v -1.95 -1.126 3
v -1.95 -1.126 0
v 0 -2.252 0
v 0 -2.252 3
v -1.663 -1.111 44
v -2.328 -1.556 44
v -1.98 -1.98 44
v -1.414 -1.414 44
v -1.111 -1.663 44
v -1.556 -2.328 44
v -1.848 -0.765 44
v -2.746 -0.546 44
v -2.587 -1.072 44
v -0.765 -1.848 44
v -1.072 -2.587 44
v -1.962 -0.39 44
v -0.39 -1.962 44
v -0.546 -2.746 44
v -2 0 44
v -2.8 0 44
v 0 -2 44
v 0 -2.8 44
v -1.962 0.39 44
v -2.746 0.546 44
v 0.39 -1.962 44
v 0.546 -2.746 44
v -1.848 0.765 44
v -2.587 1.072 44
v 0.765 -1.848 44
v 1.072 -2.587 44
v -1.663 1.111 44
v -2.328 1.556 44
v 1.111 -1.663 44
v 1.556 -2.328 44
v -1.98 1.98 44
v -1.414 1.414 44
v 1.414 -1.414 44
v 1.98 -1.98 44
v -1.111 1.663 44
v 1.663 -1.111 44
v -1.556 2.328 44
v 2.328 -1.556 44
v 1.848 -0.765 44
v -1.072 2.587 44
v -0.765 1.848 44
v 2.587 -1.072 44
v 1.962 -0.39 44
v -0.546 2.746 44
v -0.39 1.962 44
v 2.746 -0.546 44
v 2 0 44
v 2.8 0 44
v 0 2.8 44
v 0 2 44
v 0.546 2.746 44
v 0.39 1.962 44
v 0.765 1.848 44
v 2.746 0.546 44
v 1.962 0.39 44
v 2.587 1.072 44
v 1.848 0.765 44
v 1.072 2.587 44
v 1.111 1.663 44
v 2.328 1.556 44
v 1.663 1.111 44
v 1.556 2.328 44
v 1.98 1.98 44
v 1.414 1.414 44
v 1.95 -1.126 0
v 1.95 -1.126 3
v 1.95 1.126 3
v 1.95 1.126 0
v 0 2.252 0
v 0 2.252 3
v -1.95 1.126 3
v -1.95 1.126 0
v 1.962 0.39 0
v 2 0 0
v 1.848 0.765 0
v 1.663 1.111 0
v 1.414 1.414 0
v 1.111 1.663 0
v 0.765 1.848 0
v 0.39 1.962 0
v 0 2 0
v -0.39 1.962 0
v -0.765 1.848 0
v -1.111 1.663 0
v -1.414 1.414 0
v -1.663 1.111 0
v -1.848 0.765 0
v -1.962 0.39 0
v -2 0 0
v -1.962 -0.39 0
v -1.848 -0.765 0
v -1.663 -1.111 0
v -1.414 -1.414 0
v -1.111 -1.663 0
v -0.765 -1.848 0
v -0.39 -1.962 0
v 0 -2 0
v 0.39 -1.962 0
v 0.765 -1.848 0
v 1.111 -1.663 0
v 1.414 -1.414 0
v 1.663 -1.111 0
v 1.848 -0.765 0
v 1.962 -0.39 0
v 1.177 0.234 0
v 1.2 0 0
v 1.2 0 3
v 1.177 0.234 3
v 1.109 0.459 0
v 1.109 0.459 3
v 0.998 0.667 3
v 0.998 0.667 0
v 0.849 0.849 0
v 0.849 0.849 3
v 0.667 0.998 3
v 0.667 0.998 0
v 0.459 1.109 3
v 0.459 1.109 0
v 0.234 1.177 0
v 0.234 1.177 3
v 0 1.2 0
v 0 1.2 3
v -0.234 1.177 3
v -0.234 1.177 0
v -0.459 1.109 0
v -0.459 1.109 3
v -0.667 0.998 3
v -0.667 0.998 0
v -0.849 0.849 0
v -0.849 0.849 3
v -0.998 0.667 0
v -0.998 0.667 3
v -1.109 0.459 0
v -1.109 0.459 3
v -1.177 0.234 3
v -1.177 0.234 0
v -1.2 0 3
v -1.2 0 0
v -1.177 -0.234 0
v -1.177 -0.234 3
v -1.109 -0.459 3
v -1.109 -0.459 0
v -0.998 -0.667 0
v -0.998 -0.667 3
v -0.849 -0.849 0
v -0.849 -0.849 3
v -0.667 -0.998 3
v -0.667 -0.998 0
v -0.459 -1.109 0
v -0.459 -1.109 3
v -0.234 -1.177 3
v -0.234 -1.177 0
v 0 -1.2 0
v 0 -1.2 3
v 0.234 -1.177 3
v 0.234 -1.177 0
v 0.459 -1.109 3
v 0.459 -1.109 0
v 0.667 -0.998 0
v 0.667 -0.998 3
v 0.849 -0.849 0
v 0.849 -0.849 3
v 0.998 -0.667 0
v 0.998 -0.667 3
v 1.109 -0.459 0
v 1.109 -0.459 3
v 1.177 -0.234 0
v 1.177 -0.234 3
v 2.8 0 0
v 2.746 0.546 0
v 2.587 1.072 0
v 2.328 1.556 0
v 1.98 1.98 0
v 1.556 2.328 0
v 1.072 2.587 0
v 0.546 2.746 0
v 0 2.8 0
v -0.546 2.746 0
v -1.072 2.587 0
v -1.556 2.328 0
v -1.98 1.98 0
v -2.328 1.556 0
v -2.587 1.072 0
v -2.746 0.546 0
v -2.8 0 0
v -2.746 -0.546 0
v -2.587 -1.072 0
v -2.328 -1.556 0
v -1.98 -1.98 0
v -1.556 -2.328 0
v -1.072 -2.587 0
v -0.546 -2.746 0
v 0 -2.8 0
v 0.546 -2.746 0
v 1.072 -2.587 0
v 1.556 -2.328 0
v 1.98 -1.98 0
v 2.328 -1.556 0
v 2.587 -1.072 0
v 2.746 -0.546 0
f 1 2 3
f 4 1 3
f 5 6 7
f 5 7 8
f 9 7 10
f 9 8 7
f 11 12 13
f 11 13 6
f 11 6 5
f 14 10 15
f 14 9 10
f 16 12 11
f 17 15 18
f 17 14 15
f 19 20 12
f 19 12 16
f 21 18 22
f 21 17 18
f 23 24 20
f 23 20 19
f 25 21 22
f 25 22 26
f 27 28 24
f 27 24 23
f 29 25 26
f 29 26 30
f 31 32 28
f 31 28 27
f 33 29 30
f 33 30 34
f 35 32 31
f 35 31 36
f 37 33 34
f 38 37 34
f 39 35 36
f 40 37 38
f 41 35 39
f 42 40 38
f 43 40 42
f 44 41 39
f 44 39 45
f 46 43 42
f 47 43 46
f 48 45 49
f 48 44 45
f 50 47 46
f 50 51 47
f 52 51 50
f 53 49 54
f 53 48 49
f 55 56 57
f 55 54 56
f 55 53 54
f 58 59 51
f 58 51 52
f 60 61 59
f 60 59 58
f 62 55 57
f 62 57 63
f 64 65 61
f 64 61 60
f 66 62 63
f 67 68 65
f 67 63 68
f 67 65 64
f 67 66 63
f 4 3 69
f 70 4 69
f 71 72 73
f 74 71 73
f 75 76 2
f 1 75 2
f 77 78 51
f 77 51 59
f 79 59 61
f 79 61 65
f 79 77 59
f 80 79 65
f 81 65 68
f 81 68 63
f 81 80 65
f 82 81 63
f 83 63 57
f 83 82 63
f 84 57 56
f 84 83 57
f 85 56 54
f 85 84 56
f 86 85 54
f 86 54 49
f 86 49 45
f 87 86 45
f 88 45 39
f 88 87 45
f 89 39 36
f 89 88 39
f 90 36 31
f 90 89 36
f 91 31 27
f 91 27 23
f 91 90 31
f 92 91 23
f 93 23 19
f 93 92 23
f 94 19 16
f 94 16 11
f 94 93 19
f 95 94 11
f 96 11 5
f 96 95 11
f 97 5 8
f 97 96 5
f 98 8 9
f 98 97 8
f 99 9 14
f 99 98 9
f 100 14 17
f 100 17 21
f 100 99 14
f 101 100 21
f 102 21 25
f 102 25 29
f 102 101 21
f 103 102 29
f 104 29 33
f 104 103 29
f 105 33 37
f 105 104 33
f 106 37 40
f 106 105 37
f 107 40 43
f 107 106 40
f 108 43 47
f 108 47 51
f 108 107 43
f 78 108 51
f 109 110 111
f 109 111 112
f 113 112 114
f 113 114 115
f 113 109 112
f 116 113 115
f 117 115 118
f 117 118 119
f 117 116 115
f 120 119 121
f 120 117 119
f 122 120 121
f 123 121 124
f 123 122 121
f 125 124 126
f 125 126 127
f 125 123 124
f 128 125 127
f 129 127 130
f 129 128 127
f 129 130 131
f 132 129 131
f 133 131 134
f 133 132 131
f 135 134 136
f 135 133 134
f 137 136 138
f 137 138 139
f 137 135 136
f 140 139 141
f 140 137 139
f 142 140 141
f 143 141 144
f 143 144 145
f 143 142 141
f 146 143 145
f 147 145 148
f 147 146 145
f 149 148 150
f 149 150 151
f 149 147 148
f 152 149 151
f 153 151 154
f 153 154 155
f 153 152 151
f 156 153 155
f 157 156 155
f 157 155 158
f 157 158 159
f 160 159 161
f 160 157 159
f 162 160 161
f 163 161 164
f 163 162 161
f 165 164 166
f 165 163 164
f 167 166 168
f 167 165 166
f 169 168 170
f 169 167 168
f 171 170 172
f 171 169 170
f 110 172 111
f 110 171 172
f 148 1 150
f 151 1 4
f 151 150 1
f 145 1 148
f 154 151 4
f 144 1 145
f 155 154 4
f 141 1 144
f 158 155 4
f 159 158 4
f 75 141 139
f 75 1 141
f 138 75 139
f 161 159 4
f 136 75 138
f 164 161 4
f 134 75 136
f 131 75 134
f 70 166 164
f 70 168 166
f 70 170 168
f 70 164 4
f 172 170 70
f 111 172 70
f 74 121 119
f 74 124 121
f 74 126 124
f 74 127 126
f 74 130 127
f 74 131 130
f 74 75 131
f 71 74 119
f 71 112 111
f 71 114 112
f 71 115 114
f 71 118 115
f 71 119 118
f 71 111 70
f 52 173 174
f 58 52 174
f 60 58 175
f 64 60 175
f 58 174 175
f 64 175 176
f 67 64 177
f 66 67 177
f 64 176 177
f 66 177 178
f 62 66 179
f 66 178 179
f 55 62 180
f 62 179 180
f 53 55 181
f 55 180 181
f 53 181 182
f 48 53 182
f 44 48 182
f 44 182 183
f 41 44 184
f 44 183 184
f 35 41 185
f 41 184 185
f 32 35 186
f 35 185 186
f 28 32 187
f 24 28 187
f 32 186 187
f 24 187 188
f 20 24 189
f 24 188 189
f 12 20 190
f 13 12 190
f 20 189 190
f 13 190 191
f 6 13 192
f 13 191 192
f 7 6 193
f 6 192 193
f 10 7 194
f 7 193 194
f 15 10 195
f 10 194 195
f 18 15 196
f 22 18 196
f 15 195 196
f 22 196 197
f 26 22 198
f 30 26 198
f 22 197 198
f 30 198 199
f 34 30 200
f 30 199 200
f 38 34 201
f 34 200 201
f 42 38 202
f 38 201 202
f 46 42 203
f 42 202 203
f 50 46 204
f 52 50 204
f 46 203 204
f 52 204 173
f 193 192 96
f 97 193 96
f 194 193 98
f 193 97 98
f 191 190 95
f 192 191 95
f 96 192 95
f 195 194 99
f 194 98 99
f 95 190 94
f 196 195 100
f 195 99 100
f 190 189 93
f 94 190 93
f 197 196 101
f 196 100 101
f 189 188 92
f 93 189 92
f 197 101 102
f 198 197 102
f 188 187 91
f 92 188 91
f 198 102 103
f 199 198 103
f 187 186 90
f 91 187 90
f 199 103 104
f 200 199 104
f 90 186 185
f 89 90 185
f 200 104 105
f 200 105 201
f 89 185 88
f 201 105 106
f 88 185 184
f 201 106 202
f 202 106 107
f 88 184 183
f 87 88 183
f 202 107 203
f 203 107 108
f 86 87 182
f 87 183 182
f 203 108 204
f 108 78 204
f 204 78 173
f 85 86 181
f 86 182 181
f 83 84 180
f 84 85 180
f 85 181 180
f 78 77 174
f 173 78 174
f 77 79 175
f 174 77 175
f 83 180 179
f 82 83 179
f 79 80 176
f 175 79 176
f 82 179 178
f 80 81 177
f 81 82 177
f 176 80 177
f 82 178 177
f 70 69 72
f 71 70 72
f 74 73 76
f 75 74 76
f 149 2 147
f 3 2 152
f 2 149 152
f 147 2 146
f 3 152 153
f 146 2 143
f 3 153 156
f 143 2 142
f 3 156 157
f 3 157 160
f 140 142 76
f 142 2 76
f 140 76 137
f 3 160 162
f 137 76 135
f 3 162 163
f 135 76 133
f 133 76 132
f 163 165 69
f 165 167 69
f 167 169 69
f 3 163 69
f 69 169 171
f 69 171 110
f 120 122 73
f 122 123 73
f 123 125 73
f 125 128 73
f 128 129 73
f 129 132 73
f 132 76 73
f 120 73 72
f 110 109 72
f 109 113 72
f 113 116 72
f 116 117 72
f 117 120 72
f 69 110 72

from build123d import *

# Parameters (mm, degrees)
F0_R     = 1.2
F1_DEPTH = 3
F2_R     = 2.8
F2_R_2   = 2
F3_DEPTH = 44


with BuildPart() as f1:
    # F0 (on Top) → F1 (new body)
    with BuildSketch(Plane.XY):
        Polygon((1.95, -1.125833), (1.95, 1.125833), (0, 2.251666), (-1.95, 1.125833), (-1.95, -1.125833), (0, -2.251666), align=None)
        Circle(F0_R, mode=Mode.SUBTRACT)
    extrude(amount=F1_DEPTH)


with BuildPart() as f3:
    # F2 (on Top) → F3 (new body)
    with BuildSketch(Plane.XY):
        Circle(F2_R)
        Circle(F2_R_2, mode=Mode.SUBTRACT)
    extrude(amount=F3_DEPTH)


solid = Compound([f1.part, f3.part])
